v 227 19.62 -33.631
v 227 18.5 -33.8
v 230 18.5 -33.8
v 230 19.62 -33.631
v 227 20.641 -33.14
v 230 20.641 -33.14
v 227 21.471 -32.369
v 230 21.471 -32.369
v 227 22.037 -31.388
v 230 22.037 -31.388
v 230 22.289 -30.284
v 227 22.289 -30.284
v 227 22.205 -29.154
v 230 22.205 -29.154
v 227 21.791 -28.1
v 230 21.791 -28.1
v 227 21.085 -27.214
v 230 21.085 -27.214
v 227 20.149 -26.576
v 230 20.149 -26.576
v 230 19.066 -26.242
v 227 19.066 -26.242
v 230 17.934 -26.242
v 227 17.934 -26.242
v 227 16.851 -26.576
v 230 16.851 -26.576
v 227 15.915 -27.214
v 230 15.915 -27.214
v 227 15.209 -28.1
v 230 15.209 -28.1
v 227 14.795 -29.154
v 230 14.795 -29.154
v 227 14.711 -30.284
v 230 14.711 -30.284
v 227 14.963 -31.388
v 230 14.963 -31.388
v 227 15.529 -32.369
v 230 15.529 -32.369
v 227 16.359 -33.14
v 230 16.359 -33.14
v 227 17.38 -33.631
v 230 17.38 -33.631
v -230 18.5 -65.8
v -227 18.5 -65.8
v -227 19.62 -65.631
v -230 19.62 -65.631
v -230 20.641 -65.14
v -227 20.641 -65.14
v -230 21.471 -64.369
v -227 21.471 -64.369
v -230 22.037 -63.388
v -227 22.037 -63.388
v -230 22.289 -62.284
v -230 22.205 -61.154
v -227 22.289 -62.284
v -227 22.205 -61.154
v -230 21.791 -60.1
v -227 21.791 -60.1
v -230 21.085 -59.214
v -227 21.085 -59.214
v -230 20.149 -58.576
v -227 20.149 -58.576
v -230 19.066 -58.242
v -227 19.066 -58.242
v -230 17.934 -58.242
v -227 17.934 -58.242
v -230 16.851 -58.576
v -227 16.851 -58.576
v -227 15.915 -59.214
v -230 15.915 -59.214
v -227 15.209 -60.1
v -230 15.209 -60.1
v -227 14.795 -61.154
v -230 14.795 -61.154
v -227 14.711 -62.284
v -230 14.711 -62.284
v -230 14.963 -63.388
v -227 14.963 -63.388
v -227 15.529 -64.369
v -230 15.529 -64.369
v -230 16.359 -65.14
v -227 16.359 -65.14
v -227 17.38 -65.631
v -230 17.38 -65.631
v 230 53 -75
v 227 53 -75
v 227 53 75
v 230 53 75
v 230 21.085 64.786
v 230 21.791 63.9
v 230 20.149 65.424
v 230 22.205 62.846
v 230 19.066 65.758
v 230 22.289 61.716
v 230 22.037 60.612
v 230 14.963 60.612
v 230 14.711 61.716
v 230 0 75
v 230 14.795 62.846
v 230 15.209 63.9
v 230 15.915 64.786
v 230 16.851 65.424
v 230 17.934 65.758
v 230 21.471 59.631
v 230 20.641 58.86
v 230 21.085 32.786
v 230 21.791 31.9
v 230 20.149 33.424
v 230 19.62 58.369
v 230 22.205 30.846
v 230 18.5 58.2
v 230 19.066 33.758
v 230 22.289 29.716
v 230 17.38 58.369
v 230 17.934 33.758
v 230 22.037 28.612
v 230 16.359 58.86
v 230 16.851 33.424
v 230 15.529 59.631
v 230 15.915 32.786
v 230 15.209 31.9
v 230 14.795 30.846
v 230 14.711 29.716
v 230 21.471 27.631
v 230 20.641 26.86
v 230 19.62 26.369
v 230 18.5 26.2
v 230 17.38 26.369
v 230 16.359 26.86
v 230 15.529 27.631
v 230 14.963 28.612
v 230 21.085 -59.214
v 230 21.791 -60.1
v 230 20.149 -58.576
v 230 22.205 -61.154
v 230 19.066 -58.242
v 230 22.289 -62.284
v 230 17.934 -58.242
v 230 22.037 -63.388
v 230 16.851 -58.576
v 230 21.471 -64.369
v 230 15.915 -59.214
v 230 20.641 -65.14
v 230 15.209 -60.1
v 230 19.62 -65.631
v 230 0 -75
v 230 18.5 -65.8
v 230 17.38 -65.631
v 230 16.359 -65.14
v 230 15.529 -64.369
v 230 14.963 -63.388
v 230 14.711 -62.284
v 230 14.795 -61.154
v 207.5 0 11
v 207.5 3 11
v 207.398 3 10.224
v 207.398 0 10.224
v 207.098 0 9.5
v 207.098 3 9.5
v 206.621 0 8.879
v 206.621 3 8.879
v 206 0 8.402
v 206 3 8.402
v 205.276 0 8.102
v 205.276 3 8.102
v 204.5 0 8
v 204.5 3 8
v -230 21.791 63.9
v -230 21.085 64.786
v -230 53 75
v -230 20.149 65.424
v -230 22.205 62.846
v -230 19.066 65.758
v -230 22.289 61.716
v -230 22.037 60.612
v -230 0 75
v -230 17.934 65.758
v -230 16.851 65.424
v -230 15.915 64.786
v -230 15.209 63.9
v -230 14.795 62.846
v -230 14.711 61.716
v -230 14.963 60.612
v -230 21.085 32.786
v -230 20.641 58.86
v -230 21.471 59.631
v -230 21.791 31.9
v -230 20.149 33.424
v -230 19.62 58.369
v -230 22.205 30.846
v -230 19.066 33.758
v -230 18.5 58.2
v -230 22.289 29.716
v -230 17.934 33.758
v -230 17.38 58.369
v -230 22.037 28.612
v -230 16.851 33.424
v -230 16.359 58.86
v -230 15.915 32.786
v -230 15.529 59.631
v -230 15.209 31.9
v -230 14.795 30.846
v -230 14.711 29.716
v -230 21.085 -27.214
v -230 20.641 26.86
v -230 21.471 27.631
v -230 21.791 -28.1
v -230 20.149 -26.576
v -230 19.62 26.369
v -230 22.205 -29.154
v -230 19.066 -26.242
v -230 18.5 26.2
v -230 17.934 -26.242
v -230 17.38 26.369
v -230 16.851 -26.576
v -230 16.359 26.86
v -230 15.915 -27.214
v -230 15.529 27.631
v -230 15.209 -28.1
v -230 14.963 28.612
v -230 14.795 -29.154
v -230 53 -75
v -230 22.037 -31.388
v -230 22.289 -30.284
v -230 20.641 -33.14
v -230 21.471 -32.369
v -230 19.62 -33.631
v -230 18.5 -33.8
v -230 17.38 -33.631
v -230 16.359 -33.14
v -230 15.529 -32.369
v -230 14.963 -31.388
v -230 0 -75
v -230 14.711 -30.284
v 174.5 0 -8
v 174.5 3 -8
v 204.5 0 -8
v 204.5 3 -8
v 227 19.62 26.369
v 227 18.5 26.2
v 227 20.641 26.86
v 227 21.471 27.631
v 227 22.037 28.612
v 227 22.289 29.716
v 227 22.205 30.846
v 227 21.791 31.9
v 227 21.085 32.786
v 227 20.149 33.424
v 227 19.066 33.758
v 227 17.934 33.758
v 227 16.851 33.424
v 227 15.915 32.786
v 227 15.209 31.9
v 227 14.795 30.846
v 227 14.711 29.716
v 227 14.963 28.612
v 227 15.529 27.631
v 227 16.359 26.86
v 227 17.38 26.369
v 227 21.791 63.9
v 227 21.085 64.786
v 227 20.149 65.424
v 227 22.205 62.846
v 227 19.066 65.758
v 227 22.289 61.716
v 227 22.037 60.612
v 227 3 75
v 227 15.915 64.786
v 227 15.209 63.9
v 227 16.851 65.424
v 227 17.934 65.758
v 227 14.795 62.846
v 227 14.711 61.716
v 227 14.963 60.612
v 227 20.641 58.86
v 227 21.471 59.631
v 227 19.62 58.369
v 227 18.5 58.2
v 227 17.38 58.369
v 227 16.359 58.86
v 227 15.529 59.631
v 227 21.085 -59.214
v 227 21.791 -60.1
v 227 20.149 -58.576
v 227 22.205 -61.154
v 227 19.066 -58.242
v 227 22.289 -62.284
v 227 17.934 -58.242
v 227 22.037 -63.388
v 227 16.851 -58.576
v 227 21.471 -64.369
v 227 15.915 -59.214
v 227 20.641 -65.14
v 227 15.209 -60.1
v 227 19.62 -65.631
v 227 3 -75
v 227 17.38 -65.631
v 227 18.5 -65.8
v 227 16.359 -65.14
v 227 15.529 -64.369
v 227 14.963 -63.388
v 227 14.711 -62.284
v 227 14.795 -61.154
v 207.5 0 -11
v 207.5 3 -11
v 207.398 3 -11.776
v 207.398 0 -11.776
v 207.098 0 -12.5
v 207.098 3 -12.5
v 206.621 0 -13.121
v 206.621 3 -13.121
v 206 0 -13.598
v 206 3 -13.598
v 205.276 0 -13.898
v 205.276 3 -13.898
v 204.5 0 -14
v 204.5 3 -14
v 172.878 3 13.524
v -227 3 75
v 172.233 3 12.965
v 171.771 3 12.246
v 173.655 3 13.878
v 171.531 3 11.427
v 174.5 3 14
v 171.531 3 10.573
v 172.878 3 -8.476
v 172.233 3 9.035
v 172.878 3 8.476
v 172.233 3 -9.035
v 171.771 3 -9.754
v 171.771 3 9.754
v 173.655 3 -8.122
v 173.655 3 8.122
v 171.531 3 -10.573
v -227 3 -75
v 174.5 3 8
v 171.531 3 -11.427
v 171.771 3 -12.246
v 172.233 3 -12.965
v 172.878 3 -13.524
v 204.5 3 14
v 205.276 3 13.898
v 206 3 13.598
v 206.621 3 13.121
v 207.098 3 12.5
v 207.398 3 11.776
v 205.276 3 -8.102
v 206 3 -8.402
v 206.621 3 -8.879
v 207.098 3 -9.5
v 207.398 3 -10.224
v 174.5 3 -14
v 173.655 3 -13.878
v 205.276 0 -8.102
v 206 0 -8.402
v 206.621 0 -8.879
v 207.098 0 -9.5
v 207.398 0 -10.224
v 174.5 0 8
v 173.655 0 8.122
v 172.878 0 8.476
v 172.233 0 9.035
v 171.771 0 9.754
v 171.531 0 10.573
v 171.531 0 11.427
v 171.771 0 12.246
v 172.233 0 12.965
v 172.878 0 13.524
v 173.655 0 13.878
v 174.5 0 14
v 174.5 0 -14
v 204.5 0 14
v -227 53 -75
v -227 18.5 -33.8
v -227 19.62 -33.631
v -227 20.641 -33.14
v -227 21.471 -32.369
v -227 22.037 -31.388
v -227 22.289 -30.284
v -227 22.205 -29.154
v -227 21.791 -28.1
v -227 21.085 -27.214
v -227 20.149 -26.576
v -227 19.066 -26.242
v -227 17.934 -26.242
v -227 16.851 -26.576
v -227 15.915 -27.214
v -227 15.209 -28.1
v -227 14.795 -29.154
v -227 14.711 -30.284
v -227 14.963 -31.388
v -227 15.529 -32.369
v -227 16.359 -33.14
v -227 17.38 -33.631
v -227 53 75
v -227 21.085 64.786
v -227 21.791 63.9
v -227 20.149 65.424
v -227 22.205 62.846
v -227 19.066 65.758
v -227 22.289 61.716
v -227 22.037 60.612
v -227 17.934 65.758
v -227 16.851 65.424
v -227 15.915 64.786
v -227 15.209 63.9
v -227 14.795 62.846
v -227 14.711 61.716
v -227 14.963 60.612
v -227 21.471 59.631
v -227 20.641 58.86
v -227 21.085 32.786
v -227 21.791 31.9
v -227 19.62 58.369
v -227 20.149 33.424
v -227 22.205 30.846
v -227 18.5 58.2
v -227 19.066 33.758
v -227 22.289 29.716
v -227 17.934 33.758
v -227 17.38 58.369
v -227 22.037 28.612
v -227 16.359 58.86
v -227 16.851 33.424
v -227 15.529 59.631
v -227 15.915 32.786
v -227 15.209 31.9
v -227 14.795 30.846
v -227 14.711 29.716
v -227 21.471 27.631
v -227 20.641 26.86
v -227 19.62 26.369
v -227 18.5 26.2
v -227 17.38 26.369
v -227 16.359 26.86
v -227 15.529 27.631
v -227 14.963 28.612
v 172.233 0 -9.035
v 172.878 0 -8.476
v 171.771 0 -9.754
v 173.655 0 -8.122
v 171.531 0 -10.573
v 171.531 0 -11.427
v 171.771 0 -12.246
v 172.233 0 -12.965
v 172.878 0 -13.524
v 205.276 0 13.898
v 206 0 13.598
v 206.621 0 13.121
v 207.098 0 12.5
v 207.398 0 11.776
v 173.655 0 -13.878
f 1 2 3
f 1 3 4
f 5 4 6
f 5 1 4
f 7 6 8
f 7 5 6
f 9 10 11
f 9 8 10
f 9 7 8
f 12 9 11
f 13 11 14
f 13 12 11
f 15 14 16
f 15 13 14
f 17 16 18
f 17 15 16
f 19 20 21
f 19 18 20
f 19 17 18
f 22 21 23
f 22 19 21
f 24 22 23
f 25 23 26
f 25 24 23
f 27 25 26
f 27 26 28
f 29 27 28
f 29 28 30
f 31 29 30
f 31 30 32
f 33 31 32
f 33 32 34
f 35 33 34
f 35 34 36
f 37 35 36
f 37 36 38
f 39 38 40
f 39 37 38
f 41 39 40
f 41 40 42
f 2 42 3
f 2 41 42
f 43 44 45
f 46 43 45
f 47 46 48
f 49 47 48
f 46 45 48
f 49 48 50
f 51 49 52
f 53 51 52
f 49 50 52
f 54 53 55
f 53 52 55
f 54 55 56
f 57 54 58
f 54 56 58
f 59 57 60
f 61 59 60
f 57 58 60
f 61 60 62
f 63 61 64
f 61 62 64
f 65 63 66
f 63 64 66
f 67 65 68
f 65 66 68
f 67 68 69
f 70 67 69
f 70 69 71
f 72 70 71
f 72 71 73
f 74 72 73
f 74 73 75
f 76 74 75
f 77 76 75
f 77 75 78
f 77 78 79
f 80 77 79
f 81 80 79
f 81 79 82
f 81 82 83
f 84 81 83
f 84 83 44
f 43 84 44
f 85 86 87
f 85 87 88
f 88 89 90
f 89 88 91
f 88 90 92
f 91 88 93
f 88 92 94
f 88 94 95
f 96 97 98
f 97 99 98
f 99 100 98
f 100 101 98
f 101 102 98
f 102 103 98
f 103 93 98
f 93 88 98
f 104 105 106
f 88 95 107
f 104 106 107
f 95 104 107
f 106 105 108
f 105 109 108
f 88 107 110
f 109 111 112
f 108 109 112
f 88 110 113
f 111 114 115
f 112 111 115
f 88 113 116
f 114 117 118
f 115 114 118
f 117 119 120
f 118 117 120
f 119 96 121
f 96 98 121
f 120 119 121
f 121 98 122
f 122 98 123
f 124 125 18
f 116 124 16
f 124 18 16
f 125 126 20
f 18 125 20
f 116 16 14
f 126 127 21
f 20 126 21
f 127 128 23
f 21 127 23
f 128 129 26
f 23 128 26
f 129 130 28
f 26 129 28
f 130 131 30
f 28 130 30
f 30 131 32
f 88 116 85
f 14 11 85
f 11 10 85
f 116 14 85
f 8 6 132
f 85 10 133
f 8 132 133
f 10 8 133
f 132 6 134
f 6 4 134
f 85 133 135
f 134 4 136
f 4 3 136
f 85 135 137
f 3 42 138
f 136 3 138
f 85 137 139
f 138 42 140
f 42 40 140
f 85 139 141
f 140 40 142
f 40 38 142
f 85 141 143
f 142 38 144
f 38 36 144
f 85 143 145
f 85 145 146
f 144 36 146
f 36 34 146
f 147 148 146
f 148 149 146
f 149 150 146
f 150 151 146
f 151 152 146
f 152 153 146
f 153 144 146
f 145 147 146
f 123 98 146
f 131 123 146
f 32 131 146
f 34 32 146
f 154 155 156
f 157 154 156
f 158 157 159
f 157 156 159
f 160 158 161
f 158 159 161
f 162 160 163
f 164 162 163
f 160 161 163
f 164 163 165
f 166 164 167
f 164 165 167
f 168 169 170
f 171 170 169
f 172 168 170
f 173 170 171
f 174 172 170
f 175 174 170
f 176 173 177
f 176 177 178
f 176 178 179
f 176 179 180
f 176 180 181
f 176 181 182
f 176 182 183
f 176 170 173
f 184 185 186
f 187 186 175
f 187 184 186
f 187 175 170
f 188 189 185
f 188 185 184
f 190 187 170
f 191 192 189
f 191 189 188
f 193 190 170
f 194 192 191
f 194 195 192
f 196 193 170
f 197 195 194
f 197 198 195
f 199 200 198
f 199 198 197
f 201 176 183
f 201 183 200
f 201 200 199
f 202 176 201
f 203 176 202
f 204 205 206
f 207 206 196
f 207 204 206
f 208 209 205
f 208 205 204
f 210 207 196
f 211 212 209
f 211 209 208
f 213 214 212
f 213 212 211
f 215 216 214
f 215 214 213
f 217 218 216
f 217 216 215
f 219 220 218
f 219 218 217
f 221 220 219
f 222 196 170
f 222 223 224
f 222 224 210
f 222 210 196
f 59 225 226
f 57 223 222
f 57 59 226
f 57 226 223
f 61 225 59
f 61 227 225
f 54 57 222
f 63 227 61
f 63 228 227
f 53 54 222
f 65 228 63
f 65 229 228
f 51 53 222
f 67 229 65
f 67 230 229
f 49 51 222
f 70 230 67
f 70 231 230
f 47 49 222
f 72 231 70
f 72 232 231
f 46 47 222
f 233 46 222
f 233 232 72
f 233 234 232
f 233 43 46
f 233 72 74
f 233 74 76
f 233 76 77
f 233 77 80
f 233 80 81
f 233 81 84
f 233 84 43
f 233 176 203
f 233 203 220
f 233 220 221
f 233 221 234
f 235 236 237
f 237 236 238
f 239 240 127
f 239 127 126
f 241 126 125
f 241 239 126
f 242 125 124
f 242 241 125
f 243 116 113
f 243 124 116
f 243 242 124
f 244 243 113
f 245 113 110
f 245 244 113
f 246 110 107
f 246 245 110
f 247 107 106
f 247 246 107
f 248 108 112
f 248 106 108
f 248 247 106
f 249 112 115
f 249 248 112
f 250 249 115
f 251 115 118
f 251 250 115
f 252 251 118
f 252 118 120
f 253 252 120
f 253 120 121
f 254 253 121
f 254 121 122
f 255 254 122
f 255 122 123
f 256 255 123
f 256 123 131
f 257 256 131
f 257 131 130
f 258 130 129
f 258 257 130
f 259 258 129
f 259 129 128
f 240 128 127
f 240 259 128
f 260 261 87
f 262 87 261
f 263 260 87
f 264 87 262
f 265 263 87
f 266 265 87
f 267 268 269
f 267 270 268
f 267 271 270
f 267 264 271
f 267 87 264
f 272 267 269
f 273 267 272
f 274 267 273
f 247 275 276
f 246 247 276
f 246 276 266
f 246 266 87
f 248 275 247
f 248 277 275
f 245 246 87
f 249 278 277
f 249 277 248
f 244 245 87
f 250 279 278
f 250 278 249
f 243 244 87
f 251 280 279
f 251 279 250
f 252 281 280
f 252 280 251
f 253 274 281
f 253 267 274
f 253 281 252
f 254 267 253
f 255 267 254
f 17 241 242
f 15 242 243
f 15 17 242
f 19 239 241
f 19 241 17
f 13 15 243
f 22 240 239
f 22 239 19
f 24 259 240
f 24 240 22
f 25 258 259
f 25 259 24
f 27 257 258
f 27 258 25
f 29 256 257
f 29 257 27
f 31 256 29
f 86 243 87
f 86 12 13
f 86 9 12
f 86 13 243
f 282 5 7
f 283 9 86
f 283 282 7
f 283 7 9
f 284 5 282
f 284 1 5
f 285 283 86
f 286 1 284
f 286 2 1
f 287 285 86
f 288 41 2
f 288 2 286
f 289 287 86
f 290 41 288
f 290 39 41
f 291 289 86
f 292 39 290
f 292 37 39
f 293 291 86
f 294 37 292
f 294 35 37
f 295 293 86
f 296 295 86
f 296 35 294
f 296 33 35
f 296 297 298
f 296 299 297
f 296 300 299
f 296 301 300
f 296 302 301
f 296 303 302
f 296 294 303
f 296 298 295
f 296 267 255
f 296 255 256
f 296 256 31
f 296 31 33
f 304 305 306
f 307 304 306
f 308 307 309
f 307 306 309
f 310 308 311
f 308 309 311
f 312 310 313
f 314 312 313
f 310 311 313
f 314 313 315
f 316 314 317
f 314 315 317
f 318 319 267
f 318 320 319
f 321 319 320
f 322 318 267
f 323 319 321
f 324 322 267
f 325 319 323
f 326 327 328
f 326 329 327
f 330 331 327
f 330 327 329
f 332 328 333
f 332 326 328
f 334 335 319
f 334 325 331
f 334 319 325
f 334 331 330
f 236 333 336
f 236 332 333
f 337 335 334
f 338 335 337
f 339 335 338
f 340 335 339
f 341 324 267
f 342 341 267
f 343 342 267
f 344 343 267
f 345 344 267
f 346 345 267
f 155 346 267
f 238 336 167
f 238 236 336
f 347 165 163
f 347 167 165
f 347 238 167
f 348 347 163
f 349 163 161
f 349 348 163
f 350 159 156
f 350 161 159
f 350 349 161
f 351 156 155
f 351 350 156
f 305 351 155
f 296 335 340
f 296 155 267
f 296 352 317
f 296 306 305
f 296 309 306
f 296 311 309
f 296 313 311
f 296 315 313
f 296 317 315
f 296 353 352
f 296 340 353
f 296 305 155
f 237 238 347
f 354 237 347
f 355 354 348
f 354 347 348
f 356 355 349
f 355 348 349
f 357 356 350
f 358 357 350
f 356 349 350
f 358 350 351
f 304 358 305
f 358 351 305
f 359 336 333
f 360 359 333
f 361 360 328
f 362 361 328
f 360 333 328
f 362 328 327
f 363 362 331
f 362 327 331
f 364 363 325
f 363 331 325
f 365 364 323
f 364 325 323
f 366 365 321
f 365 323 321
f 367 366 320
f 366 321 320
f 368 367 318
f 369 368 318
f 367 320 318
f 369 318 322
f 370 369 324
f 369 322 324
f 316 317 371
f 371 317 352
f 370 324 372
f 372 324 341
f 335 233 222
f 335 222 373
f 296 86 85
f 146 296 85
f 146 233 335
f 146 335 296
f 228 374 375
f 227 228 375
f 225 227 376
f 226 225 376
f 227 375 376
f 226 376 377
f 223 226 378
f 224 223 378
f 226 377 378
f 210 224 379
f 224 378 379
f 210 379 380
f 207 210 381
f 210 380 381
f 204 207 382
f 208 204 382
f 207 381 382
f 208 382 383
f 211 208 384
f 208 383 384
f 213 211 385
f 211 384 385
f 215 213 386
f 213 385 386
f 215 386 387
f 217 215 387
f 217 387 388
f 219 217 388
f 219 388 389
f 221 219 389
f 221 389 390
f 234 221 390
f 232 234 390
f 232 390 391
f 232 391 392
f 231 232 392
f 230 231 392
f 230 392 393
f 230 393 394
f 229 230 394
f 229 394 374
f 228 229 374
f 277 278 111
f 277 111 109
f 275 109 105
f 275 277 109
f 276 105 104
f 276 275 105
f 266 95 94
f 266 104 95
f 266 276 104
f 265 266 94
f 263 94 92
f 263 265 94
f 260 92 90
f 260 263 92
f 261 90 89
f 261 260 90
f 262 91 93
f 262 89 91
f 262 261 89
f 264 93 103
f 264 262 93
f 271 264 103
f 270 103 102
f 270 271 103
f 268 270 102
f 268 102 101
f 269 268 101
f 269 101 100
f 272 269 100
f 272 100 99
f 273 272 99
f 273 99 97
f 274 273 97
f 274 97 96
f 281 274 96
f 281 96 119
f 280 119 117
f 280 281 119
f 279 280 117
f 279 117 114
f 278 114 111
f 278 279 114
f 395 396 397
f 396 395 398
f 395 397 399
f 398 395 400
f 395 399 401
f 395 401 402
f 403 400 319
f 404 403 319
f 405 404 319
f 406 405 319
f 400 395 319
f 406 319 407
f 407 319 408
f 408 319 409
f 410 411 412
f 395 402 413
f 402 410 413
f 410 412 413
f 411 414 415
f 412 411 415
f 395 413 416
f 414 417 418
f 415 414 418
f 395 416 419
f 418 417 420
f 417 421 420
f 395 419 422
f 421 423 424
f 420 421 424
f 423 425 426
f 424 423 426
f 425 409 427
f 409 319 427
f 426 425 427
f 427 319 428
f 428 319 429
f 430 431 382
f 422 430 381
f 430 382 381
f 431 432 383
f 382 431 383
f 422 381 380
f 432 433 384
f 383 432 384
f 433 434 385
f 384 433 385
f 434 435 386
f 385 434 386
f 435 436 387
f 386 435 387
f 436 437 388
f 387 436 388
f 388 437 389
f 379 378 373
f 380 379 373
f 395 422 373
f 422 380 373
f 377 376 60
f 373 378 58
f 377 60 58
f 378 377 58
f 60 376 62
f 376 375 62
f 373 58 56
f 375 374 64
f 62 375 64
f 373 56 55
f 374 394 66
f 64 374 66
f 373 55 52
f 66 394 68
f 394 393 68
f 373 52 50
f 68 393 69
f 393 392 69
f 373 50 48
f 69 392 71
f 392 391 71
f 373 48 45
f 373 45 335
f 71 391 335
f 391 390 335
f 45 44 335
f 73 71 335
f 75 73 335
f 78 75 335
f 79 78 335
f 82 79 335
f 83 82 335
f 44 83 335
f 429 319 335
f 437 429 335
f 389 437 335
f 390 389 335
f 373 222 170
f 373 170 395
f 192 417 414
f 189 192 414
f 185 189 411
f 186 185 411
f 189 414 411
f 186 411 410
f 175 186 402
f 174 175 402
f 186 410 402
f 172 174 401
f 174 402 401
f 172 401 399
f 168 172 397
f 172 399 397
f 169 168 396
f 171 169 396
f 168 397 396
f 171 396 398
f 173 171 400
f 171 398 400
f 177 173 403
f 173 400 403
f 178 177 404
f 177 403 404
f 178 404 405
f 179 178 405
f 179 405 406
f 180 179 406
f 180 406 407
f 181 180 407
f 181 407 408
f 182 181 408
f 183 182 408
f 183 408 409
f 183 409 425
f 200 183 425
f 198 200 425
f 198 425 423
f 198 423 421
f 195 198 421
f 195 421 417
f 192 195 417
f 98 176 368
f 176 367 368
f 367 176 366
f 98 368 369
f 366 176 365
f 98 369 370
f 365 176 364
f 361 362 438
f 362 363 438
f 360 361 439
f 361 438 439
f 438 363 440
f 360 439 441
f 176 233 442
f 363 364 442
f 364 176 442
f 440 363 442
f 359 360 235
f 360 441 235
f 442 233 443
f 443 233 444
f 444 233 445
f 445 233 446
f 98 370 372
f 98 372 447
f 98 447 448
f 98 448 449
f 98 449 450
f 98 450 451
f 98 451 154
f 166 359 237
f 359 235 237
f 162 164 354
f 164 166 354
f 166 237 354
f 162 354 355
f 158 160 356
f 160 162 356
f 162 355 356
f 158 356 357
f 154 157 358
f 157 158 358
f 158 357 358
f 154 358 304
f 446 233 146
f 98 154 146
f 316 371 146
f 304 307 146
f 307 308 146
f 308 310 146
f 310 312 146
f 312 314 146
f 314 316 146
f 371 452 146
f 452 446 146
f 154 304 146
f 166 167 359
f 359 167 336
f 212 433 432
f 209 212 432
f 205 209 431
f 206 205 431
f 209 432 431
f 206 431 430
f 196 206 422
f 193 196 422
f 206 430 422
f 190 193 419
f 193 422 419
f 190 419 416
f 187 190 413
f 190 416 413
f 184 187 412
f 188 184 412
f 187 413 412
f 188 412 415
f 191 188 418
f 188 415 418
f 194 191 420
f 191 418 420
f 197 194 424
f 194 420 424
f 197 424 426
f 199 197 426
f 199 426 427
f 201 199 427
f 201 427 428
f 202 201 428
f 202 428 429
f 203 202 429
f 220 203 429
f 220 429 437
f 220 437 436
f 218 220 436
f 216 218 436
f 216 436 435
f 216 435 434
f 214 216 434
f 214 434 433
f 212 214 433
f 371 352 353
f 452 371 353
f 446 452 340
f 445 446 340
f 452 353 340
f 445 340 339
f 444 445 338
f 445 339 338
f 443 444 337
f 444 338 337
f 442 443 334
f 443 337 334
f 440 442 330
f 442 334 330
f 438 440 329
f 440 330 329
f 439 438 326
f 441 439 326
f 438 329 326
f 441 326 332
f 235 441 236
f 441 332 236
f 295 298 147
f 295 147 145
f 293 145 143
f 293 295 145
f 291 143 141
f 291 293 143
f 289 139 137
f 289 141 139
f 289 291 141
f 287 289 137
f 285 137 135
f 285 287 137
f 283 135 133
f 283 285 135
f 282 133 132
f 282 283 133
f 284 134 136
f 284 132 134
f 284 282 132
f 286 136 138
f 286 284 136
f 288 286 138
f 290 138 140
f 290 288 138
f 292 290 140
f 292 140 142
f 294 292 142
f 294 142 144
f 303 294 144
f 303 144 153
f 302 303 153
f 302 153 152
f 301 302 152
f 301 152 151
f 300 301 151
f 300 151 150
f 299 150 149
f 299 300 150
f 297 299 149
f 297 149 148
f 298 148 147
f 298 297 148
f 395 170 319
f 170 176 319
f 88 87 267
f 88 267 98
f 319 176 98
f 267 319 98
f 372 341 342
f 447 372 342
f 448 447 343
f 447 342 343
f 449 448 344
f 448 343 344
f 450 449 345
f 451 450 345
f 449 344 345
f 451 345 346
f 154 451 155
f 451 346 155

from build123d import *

# Parameters (mm, degrees)
SKETCH1_W               = 460
SKETCH1_H               = 150
BOSS_EXTRUDE1_DEPTH     = 3
SKETCH2_W               = 3
SKETCH2_H               = 150
BOSS_EXTRUDE2_DEPTH     = 50
SKETCH4_R               = 3.8
CUT_EXTRUDE1_DEPTH      = 458
CUT_EXTRUDE1_DEPTH_BACK = 4
CUT_EXTRUDE2_DEPTH      = 10


with BuildPart() as part:
    # Sketch1 → Boss-Extrude1 (new body)
    with BuildSketch(Plane(origin=(0, 0, 0), x_dir=(1, 0, 0), z_dir=(0, 1, 0))):
        Rectangle(SKETCH1_W, SKETCH1_H)
    extrude(amount=BOSS_EXTRUDE1_DEPTH)

    # Sketch2 → Boss-Extrude2 (add)
    with BuildSketch(Plane(origin=(0, 3, 0), x_dir=(1, 0, 0), z_dir=(0, 1, 0))):
        with Locations((-228.5, 0)):
            Rectangle(SKETCH2_W, SKETCH2_H)
        with Locations((228.5, 0)):
            Rectangle(SKETCH2_W, SKETCH2_H)
    extrude(amount=BOSS_EXTRUDE2_DEPTH)

    # Sketch4 → Cut-Extrude1 (cut, two sides)
    with BuildSketch(Plane(origin=(-227, 0, 0), x_dir=(0, 0, -1), z_dir=(1, 0, 0))) as cut_extrude1_sk:
        with Locations((62, 18.5)):
            Circle(SKETCH4_R)
        with Locations((30, 18.5)):
            Circle(SKETCH4_R)
        with Locations((-62, 18.5)):
            Circle(SKETCH4_R)
        with Locations((-30, 18.5)):
            Circle(SKETCH4_R)
    extrude(amount=CUT_EXTRUDE1_DEPTH, mode=Mode.SUBTRACT)
    extrude(cut_extrude1_sk.sketch, amount=-CUT_EXTRUDE1_DEPTH_BACK, mode=Mode.SUBTRACT)

    # Sketch5 → Cut-Extrude2 (cut)
    with BuildSketch(Plane(origin=(0, 3, 0), x_dir=(1, 0, 0), z_dir=(0, 1, 0))):
        with BuildLine():
            ThreePointArc((174.5, -8), (171.5, -11), (174.5, -14))
            Line((174.5, -14), (174.5, -8))
        make_face()
        with BuildLine():
            Line((174.5, -8), (174.5, -14))
            ThreePointArc((174.5, -14), (176.621320344, -13.121320344), (177.5, -11))
            ThreePointArc((177.5, -11), (176.621320344, -8.878679656), (174.5, -8))
        make_face()
        with BuildLine():
            Line((174.5, -14), (204.5, -14))
            ThreePointArc((204.5, -14), (201.5, -11), (204.5, -8))
            Line((204.5, -8), (174.5, -8))
            ThreePointArc((174.5, -8), (176.621320344, -8.878679656), (177.5, -11))
            ThreePointArc((177.5, -11), (176.621320344, -13.121320344), (174.5, -14))
        make_face()
        with BuildLine():
            ThreePointArc((204.5, -8), (201.5, -11), (204.5, -14))
            Line((204.5, -14), (204.5, -8))
        make_face()
        with BuildLine():
            Line((204.5, -8), (204.5, -14))
            ThreePointArc((204.5, -14), (206.621320344, -13.121320344), (207.5, -11))
            ThreePointArc((207.5, -11), (206.621320344, -8.878679656), (204.5, -8))
        make_face()
        with BuildLine():
            ThreePointArc((204.5, 14), (201.5, 11), (204.5, 8))
            Line((204.5, 8), (204.5, 14))
        make_face()
        with BuildLine():
            Line((204.5, 14), (204.5, 8))
            ThreePointArc((204.5, 8), (206.621320344, 8.878679656), (207.5, 11))
            ThreePointArc((207.5, 11), (206.621320344, 13.121320344), (204.5, 14))
        make_face()
        with BuildLine():
            ThreePointArc((177.5, 11), (176.621320344, 8.878679656), (174.5, 8))
            Line((174.5, 8), (204.5, 8))
            ThreePointArc((204.5, 8), (201.5, 11), (204.5, 14))
            Line((204.5, 14), (174.5, 14))
            ThreePointArc((174.5, 14), (176.621320344, 13.121320344), (177.5, 11))
        make_face()
        with BuildLine():
            ThreePointArc((174.5, 14), (171.5, 11), (174.5, 8))
            Line((174.5, 8), (174.5, 14))
        make_face()
        with BuildLine():
            Line((174.5, 14), (174.5, 8))
            ThreePointArc((174.5, 8), (176.621320344, 8.878679656), (177.5, 11))
            ThreePointArc((177.5, 11), (176.621320344, 13.121320344), (174.5, 14))
        make_face()
    extrude(amount=-CUT_EXTRUDE2_DEPTH, mode=Mode.SUBTRACT)


solid = part.part
